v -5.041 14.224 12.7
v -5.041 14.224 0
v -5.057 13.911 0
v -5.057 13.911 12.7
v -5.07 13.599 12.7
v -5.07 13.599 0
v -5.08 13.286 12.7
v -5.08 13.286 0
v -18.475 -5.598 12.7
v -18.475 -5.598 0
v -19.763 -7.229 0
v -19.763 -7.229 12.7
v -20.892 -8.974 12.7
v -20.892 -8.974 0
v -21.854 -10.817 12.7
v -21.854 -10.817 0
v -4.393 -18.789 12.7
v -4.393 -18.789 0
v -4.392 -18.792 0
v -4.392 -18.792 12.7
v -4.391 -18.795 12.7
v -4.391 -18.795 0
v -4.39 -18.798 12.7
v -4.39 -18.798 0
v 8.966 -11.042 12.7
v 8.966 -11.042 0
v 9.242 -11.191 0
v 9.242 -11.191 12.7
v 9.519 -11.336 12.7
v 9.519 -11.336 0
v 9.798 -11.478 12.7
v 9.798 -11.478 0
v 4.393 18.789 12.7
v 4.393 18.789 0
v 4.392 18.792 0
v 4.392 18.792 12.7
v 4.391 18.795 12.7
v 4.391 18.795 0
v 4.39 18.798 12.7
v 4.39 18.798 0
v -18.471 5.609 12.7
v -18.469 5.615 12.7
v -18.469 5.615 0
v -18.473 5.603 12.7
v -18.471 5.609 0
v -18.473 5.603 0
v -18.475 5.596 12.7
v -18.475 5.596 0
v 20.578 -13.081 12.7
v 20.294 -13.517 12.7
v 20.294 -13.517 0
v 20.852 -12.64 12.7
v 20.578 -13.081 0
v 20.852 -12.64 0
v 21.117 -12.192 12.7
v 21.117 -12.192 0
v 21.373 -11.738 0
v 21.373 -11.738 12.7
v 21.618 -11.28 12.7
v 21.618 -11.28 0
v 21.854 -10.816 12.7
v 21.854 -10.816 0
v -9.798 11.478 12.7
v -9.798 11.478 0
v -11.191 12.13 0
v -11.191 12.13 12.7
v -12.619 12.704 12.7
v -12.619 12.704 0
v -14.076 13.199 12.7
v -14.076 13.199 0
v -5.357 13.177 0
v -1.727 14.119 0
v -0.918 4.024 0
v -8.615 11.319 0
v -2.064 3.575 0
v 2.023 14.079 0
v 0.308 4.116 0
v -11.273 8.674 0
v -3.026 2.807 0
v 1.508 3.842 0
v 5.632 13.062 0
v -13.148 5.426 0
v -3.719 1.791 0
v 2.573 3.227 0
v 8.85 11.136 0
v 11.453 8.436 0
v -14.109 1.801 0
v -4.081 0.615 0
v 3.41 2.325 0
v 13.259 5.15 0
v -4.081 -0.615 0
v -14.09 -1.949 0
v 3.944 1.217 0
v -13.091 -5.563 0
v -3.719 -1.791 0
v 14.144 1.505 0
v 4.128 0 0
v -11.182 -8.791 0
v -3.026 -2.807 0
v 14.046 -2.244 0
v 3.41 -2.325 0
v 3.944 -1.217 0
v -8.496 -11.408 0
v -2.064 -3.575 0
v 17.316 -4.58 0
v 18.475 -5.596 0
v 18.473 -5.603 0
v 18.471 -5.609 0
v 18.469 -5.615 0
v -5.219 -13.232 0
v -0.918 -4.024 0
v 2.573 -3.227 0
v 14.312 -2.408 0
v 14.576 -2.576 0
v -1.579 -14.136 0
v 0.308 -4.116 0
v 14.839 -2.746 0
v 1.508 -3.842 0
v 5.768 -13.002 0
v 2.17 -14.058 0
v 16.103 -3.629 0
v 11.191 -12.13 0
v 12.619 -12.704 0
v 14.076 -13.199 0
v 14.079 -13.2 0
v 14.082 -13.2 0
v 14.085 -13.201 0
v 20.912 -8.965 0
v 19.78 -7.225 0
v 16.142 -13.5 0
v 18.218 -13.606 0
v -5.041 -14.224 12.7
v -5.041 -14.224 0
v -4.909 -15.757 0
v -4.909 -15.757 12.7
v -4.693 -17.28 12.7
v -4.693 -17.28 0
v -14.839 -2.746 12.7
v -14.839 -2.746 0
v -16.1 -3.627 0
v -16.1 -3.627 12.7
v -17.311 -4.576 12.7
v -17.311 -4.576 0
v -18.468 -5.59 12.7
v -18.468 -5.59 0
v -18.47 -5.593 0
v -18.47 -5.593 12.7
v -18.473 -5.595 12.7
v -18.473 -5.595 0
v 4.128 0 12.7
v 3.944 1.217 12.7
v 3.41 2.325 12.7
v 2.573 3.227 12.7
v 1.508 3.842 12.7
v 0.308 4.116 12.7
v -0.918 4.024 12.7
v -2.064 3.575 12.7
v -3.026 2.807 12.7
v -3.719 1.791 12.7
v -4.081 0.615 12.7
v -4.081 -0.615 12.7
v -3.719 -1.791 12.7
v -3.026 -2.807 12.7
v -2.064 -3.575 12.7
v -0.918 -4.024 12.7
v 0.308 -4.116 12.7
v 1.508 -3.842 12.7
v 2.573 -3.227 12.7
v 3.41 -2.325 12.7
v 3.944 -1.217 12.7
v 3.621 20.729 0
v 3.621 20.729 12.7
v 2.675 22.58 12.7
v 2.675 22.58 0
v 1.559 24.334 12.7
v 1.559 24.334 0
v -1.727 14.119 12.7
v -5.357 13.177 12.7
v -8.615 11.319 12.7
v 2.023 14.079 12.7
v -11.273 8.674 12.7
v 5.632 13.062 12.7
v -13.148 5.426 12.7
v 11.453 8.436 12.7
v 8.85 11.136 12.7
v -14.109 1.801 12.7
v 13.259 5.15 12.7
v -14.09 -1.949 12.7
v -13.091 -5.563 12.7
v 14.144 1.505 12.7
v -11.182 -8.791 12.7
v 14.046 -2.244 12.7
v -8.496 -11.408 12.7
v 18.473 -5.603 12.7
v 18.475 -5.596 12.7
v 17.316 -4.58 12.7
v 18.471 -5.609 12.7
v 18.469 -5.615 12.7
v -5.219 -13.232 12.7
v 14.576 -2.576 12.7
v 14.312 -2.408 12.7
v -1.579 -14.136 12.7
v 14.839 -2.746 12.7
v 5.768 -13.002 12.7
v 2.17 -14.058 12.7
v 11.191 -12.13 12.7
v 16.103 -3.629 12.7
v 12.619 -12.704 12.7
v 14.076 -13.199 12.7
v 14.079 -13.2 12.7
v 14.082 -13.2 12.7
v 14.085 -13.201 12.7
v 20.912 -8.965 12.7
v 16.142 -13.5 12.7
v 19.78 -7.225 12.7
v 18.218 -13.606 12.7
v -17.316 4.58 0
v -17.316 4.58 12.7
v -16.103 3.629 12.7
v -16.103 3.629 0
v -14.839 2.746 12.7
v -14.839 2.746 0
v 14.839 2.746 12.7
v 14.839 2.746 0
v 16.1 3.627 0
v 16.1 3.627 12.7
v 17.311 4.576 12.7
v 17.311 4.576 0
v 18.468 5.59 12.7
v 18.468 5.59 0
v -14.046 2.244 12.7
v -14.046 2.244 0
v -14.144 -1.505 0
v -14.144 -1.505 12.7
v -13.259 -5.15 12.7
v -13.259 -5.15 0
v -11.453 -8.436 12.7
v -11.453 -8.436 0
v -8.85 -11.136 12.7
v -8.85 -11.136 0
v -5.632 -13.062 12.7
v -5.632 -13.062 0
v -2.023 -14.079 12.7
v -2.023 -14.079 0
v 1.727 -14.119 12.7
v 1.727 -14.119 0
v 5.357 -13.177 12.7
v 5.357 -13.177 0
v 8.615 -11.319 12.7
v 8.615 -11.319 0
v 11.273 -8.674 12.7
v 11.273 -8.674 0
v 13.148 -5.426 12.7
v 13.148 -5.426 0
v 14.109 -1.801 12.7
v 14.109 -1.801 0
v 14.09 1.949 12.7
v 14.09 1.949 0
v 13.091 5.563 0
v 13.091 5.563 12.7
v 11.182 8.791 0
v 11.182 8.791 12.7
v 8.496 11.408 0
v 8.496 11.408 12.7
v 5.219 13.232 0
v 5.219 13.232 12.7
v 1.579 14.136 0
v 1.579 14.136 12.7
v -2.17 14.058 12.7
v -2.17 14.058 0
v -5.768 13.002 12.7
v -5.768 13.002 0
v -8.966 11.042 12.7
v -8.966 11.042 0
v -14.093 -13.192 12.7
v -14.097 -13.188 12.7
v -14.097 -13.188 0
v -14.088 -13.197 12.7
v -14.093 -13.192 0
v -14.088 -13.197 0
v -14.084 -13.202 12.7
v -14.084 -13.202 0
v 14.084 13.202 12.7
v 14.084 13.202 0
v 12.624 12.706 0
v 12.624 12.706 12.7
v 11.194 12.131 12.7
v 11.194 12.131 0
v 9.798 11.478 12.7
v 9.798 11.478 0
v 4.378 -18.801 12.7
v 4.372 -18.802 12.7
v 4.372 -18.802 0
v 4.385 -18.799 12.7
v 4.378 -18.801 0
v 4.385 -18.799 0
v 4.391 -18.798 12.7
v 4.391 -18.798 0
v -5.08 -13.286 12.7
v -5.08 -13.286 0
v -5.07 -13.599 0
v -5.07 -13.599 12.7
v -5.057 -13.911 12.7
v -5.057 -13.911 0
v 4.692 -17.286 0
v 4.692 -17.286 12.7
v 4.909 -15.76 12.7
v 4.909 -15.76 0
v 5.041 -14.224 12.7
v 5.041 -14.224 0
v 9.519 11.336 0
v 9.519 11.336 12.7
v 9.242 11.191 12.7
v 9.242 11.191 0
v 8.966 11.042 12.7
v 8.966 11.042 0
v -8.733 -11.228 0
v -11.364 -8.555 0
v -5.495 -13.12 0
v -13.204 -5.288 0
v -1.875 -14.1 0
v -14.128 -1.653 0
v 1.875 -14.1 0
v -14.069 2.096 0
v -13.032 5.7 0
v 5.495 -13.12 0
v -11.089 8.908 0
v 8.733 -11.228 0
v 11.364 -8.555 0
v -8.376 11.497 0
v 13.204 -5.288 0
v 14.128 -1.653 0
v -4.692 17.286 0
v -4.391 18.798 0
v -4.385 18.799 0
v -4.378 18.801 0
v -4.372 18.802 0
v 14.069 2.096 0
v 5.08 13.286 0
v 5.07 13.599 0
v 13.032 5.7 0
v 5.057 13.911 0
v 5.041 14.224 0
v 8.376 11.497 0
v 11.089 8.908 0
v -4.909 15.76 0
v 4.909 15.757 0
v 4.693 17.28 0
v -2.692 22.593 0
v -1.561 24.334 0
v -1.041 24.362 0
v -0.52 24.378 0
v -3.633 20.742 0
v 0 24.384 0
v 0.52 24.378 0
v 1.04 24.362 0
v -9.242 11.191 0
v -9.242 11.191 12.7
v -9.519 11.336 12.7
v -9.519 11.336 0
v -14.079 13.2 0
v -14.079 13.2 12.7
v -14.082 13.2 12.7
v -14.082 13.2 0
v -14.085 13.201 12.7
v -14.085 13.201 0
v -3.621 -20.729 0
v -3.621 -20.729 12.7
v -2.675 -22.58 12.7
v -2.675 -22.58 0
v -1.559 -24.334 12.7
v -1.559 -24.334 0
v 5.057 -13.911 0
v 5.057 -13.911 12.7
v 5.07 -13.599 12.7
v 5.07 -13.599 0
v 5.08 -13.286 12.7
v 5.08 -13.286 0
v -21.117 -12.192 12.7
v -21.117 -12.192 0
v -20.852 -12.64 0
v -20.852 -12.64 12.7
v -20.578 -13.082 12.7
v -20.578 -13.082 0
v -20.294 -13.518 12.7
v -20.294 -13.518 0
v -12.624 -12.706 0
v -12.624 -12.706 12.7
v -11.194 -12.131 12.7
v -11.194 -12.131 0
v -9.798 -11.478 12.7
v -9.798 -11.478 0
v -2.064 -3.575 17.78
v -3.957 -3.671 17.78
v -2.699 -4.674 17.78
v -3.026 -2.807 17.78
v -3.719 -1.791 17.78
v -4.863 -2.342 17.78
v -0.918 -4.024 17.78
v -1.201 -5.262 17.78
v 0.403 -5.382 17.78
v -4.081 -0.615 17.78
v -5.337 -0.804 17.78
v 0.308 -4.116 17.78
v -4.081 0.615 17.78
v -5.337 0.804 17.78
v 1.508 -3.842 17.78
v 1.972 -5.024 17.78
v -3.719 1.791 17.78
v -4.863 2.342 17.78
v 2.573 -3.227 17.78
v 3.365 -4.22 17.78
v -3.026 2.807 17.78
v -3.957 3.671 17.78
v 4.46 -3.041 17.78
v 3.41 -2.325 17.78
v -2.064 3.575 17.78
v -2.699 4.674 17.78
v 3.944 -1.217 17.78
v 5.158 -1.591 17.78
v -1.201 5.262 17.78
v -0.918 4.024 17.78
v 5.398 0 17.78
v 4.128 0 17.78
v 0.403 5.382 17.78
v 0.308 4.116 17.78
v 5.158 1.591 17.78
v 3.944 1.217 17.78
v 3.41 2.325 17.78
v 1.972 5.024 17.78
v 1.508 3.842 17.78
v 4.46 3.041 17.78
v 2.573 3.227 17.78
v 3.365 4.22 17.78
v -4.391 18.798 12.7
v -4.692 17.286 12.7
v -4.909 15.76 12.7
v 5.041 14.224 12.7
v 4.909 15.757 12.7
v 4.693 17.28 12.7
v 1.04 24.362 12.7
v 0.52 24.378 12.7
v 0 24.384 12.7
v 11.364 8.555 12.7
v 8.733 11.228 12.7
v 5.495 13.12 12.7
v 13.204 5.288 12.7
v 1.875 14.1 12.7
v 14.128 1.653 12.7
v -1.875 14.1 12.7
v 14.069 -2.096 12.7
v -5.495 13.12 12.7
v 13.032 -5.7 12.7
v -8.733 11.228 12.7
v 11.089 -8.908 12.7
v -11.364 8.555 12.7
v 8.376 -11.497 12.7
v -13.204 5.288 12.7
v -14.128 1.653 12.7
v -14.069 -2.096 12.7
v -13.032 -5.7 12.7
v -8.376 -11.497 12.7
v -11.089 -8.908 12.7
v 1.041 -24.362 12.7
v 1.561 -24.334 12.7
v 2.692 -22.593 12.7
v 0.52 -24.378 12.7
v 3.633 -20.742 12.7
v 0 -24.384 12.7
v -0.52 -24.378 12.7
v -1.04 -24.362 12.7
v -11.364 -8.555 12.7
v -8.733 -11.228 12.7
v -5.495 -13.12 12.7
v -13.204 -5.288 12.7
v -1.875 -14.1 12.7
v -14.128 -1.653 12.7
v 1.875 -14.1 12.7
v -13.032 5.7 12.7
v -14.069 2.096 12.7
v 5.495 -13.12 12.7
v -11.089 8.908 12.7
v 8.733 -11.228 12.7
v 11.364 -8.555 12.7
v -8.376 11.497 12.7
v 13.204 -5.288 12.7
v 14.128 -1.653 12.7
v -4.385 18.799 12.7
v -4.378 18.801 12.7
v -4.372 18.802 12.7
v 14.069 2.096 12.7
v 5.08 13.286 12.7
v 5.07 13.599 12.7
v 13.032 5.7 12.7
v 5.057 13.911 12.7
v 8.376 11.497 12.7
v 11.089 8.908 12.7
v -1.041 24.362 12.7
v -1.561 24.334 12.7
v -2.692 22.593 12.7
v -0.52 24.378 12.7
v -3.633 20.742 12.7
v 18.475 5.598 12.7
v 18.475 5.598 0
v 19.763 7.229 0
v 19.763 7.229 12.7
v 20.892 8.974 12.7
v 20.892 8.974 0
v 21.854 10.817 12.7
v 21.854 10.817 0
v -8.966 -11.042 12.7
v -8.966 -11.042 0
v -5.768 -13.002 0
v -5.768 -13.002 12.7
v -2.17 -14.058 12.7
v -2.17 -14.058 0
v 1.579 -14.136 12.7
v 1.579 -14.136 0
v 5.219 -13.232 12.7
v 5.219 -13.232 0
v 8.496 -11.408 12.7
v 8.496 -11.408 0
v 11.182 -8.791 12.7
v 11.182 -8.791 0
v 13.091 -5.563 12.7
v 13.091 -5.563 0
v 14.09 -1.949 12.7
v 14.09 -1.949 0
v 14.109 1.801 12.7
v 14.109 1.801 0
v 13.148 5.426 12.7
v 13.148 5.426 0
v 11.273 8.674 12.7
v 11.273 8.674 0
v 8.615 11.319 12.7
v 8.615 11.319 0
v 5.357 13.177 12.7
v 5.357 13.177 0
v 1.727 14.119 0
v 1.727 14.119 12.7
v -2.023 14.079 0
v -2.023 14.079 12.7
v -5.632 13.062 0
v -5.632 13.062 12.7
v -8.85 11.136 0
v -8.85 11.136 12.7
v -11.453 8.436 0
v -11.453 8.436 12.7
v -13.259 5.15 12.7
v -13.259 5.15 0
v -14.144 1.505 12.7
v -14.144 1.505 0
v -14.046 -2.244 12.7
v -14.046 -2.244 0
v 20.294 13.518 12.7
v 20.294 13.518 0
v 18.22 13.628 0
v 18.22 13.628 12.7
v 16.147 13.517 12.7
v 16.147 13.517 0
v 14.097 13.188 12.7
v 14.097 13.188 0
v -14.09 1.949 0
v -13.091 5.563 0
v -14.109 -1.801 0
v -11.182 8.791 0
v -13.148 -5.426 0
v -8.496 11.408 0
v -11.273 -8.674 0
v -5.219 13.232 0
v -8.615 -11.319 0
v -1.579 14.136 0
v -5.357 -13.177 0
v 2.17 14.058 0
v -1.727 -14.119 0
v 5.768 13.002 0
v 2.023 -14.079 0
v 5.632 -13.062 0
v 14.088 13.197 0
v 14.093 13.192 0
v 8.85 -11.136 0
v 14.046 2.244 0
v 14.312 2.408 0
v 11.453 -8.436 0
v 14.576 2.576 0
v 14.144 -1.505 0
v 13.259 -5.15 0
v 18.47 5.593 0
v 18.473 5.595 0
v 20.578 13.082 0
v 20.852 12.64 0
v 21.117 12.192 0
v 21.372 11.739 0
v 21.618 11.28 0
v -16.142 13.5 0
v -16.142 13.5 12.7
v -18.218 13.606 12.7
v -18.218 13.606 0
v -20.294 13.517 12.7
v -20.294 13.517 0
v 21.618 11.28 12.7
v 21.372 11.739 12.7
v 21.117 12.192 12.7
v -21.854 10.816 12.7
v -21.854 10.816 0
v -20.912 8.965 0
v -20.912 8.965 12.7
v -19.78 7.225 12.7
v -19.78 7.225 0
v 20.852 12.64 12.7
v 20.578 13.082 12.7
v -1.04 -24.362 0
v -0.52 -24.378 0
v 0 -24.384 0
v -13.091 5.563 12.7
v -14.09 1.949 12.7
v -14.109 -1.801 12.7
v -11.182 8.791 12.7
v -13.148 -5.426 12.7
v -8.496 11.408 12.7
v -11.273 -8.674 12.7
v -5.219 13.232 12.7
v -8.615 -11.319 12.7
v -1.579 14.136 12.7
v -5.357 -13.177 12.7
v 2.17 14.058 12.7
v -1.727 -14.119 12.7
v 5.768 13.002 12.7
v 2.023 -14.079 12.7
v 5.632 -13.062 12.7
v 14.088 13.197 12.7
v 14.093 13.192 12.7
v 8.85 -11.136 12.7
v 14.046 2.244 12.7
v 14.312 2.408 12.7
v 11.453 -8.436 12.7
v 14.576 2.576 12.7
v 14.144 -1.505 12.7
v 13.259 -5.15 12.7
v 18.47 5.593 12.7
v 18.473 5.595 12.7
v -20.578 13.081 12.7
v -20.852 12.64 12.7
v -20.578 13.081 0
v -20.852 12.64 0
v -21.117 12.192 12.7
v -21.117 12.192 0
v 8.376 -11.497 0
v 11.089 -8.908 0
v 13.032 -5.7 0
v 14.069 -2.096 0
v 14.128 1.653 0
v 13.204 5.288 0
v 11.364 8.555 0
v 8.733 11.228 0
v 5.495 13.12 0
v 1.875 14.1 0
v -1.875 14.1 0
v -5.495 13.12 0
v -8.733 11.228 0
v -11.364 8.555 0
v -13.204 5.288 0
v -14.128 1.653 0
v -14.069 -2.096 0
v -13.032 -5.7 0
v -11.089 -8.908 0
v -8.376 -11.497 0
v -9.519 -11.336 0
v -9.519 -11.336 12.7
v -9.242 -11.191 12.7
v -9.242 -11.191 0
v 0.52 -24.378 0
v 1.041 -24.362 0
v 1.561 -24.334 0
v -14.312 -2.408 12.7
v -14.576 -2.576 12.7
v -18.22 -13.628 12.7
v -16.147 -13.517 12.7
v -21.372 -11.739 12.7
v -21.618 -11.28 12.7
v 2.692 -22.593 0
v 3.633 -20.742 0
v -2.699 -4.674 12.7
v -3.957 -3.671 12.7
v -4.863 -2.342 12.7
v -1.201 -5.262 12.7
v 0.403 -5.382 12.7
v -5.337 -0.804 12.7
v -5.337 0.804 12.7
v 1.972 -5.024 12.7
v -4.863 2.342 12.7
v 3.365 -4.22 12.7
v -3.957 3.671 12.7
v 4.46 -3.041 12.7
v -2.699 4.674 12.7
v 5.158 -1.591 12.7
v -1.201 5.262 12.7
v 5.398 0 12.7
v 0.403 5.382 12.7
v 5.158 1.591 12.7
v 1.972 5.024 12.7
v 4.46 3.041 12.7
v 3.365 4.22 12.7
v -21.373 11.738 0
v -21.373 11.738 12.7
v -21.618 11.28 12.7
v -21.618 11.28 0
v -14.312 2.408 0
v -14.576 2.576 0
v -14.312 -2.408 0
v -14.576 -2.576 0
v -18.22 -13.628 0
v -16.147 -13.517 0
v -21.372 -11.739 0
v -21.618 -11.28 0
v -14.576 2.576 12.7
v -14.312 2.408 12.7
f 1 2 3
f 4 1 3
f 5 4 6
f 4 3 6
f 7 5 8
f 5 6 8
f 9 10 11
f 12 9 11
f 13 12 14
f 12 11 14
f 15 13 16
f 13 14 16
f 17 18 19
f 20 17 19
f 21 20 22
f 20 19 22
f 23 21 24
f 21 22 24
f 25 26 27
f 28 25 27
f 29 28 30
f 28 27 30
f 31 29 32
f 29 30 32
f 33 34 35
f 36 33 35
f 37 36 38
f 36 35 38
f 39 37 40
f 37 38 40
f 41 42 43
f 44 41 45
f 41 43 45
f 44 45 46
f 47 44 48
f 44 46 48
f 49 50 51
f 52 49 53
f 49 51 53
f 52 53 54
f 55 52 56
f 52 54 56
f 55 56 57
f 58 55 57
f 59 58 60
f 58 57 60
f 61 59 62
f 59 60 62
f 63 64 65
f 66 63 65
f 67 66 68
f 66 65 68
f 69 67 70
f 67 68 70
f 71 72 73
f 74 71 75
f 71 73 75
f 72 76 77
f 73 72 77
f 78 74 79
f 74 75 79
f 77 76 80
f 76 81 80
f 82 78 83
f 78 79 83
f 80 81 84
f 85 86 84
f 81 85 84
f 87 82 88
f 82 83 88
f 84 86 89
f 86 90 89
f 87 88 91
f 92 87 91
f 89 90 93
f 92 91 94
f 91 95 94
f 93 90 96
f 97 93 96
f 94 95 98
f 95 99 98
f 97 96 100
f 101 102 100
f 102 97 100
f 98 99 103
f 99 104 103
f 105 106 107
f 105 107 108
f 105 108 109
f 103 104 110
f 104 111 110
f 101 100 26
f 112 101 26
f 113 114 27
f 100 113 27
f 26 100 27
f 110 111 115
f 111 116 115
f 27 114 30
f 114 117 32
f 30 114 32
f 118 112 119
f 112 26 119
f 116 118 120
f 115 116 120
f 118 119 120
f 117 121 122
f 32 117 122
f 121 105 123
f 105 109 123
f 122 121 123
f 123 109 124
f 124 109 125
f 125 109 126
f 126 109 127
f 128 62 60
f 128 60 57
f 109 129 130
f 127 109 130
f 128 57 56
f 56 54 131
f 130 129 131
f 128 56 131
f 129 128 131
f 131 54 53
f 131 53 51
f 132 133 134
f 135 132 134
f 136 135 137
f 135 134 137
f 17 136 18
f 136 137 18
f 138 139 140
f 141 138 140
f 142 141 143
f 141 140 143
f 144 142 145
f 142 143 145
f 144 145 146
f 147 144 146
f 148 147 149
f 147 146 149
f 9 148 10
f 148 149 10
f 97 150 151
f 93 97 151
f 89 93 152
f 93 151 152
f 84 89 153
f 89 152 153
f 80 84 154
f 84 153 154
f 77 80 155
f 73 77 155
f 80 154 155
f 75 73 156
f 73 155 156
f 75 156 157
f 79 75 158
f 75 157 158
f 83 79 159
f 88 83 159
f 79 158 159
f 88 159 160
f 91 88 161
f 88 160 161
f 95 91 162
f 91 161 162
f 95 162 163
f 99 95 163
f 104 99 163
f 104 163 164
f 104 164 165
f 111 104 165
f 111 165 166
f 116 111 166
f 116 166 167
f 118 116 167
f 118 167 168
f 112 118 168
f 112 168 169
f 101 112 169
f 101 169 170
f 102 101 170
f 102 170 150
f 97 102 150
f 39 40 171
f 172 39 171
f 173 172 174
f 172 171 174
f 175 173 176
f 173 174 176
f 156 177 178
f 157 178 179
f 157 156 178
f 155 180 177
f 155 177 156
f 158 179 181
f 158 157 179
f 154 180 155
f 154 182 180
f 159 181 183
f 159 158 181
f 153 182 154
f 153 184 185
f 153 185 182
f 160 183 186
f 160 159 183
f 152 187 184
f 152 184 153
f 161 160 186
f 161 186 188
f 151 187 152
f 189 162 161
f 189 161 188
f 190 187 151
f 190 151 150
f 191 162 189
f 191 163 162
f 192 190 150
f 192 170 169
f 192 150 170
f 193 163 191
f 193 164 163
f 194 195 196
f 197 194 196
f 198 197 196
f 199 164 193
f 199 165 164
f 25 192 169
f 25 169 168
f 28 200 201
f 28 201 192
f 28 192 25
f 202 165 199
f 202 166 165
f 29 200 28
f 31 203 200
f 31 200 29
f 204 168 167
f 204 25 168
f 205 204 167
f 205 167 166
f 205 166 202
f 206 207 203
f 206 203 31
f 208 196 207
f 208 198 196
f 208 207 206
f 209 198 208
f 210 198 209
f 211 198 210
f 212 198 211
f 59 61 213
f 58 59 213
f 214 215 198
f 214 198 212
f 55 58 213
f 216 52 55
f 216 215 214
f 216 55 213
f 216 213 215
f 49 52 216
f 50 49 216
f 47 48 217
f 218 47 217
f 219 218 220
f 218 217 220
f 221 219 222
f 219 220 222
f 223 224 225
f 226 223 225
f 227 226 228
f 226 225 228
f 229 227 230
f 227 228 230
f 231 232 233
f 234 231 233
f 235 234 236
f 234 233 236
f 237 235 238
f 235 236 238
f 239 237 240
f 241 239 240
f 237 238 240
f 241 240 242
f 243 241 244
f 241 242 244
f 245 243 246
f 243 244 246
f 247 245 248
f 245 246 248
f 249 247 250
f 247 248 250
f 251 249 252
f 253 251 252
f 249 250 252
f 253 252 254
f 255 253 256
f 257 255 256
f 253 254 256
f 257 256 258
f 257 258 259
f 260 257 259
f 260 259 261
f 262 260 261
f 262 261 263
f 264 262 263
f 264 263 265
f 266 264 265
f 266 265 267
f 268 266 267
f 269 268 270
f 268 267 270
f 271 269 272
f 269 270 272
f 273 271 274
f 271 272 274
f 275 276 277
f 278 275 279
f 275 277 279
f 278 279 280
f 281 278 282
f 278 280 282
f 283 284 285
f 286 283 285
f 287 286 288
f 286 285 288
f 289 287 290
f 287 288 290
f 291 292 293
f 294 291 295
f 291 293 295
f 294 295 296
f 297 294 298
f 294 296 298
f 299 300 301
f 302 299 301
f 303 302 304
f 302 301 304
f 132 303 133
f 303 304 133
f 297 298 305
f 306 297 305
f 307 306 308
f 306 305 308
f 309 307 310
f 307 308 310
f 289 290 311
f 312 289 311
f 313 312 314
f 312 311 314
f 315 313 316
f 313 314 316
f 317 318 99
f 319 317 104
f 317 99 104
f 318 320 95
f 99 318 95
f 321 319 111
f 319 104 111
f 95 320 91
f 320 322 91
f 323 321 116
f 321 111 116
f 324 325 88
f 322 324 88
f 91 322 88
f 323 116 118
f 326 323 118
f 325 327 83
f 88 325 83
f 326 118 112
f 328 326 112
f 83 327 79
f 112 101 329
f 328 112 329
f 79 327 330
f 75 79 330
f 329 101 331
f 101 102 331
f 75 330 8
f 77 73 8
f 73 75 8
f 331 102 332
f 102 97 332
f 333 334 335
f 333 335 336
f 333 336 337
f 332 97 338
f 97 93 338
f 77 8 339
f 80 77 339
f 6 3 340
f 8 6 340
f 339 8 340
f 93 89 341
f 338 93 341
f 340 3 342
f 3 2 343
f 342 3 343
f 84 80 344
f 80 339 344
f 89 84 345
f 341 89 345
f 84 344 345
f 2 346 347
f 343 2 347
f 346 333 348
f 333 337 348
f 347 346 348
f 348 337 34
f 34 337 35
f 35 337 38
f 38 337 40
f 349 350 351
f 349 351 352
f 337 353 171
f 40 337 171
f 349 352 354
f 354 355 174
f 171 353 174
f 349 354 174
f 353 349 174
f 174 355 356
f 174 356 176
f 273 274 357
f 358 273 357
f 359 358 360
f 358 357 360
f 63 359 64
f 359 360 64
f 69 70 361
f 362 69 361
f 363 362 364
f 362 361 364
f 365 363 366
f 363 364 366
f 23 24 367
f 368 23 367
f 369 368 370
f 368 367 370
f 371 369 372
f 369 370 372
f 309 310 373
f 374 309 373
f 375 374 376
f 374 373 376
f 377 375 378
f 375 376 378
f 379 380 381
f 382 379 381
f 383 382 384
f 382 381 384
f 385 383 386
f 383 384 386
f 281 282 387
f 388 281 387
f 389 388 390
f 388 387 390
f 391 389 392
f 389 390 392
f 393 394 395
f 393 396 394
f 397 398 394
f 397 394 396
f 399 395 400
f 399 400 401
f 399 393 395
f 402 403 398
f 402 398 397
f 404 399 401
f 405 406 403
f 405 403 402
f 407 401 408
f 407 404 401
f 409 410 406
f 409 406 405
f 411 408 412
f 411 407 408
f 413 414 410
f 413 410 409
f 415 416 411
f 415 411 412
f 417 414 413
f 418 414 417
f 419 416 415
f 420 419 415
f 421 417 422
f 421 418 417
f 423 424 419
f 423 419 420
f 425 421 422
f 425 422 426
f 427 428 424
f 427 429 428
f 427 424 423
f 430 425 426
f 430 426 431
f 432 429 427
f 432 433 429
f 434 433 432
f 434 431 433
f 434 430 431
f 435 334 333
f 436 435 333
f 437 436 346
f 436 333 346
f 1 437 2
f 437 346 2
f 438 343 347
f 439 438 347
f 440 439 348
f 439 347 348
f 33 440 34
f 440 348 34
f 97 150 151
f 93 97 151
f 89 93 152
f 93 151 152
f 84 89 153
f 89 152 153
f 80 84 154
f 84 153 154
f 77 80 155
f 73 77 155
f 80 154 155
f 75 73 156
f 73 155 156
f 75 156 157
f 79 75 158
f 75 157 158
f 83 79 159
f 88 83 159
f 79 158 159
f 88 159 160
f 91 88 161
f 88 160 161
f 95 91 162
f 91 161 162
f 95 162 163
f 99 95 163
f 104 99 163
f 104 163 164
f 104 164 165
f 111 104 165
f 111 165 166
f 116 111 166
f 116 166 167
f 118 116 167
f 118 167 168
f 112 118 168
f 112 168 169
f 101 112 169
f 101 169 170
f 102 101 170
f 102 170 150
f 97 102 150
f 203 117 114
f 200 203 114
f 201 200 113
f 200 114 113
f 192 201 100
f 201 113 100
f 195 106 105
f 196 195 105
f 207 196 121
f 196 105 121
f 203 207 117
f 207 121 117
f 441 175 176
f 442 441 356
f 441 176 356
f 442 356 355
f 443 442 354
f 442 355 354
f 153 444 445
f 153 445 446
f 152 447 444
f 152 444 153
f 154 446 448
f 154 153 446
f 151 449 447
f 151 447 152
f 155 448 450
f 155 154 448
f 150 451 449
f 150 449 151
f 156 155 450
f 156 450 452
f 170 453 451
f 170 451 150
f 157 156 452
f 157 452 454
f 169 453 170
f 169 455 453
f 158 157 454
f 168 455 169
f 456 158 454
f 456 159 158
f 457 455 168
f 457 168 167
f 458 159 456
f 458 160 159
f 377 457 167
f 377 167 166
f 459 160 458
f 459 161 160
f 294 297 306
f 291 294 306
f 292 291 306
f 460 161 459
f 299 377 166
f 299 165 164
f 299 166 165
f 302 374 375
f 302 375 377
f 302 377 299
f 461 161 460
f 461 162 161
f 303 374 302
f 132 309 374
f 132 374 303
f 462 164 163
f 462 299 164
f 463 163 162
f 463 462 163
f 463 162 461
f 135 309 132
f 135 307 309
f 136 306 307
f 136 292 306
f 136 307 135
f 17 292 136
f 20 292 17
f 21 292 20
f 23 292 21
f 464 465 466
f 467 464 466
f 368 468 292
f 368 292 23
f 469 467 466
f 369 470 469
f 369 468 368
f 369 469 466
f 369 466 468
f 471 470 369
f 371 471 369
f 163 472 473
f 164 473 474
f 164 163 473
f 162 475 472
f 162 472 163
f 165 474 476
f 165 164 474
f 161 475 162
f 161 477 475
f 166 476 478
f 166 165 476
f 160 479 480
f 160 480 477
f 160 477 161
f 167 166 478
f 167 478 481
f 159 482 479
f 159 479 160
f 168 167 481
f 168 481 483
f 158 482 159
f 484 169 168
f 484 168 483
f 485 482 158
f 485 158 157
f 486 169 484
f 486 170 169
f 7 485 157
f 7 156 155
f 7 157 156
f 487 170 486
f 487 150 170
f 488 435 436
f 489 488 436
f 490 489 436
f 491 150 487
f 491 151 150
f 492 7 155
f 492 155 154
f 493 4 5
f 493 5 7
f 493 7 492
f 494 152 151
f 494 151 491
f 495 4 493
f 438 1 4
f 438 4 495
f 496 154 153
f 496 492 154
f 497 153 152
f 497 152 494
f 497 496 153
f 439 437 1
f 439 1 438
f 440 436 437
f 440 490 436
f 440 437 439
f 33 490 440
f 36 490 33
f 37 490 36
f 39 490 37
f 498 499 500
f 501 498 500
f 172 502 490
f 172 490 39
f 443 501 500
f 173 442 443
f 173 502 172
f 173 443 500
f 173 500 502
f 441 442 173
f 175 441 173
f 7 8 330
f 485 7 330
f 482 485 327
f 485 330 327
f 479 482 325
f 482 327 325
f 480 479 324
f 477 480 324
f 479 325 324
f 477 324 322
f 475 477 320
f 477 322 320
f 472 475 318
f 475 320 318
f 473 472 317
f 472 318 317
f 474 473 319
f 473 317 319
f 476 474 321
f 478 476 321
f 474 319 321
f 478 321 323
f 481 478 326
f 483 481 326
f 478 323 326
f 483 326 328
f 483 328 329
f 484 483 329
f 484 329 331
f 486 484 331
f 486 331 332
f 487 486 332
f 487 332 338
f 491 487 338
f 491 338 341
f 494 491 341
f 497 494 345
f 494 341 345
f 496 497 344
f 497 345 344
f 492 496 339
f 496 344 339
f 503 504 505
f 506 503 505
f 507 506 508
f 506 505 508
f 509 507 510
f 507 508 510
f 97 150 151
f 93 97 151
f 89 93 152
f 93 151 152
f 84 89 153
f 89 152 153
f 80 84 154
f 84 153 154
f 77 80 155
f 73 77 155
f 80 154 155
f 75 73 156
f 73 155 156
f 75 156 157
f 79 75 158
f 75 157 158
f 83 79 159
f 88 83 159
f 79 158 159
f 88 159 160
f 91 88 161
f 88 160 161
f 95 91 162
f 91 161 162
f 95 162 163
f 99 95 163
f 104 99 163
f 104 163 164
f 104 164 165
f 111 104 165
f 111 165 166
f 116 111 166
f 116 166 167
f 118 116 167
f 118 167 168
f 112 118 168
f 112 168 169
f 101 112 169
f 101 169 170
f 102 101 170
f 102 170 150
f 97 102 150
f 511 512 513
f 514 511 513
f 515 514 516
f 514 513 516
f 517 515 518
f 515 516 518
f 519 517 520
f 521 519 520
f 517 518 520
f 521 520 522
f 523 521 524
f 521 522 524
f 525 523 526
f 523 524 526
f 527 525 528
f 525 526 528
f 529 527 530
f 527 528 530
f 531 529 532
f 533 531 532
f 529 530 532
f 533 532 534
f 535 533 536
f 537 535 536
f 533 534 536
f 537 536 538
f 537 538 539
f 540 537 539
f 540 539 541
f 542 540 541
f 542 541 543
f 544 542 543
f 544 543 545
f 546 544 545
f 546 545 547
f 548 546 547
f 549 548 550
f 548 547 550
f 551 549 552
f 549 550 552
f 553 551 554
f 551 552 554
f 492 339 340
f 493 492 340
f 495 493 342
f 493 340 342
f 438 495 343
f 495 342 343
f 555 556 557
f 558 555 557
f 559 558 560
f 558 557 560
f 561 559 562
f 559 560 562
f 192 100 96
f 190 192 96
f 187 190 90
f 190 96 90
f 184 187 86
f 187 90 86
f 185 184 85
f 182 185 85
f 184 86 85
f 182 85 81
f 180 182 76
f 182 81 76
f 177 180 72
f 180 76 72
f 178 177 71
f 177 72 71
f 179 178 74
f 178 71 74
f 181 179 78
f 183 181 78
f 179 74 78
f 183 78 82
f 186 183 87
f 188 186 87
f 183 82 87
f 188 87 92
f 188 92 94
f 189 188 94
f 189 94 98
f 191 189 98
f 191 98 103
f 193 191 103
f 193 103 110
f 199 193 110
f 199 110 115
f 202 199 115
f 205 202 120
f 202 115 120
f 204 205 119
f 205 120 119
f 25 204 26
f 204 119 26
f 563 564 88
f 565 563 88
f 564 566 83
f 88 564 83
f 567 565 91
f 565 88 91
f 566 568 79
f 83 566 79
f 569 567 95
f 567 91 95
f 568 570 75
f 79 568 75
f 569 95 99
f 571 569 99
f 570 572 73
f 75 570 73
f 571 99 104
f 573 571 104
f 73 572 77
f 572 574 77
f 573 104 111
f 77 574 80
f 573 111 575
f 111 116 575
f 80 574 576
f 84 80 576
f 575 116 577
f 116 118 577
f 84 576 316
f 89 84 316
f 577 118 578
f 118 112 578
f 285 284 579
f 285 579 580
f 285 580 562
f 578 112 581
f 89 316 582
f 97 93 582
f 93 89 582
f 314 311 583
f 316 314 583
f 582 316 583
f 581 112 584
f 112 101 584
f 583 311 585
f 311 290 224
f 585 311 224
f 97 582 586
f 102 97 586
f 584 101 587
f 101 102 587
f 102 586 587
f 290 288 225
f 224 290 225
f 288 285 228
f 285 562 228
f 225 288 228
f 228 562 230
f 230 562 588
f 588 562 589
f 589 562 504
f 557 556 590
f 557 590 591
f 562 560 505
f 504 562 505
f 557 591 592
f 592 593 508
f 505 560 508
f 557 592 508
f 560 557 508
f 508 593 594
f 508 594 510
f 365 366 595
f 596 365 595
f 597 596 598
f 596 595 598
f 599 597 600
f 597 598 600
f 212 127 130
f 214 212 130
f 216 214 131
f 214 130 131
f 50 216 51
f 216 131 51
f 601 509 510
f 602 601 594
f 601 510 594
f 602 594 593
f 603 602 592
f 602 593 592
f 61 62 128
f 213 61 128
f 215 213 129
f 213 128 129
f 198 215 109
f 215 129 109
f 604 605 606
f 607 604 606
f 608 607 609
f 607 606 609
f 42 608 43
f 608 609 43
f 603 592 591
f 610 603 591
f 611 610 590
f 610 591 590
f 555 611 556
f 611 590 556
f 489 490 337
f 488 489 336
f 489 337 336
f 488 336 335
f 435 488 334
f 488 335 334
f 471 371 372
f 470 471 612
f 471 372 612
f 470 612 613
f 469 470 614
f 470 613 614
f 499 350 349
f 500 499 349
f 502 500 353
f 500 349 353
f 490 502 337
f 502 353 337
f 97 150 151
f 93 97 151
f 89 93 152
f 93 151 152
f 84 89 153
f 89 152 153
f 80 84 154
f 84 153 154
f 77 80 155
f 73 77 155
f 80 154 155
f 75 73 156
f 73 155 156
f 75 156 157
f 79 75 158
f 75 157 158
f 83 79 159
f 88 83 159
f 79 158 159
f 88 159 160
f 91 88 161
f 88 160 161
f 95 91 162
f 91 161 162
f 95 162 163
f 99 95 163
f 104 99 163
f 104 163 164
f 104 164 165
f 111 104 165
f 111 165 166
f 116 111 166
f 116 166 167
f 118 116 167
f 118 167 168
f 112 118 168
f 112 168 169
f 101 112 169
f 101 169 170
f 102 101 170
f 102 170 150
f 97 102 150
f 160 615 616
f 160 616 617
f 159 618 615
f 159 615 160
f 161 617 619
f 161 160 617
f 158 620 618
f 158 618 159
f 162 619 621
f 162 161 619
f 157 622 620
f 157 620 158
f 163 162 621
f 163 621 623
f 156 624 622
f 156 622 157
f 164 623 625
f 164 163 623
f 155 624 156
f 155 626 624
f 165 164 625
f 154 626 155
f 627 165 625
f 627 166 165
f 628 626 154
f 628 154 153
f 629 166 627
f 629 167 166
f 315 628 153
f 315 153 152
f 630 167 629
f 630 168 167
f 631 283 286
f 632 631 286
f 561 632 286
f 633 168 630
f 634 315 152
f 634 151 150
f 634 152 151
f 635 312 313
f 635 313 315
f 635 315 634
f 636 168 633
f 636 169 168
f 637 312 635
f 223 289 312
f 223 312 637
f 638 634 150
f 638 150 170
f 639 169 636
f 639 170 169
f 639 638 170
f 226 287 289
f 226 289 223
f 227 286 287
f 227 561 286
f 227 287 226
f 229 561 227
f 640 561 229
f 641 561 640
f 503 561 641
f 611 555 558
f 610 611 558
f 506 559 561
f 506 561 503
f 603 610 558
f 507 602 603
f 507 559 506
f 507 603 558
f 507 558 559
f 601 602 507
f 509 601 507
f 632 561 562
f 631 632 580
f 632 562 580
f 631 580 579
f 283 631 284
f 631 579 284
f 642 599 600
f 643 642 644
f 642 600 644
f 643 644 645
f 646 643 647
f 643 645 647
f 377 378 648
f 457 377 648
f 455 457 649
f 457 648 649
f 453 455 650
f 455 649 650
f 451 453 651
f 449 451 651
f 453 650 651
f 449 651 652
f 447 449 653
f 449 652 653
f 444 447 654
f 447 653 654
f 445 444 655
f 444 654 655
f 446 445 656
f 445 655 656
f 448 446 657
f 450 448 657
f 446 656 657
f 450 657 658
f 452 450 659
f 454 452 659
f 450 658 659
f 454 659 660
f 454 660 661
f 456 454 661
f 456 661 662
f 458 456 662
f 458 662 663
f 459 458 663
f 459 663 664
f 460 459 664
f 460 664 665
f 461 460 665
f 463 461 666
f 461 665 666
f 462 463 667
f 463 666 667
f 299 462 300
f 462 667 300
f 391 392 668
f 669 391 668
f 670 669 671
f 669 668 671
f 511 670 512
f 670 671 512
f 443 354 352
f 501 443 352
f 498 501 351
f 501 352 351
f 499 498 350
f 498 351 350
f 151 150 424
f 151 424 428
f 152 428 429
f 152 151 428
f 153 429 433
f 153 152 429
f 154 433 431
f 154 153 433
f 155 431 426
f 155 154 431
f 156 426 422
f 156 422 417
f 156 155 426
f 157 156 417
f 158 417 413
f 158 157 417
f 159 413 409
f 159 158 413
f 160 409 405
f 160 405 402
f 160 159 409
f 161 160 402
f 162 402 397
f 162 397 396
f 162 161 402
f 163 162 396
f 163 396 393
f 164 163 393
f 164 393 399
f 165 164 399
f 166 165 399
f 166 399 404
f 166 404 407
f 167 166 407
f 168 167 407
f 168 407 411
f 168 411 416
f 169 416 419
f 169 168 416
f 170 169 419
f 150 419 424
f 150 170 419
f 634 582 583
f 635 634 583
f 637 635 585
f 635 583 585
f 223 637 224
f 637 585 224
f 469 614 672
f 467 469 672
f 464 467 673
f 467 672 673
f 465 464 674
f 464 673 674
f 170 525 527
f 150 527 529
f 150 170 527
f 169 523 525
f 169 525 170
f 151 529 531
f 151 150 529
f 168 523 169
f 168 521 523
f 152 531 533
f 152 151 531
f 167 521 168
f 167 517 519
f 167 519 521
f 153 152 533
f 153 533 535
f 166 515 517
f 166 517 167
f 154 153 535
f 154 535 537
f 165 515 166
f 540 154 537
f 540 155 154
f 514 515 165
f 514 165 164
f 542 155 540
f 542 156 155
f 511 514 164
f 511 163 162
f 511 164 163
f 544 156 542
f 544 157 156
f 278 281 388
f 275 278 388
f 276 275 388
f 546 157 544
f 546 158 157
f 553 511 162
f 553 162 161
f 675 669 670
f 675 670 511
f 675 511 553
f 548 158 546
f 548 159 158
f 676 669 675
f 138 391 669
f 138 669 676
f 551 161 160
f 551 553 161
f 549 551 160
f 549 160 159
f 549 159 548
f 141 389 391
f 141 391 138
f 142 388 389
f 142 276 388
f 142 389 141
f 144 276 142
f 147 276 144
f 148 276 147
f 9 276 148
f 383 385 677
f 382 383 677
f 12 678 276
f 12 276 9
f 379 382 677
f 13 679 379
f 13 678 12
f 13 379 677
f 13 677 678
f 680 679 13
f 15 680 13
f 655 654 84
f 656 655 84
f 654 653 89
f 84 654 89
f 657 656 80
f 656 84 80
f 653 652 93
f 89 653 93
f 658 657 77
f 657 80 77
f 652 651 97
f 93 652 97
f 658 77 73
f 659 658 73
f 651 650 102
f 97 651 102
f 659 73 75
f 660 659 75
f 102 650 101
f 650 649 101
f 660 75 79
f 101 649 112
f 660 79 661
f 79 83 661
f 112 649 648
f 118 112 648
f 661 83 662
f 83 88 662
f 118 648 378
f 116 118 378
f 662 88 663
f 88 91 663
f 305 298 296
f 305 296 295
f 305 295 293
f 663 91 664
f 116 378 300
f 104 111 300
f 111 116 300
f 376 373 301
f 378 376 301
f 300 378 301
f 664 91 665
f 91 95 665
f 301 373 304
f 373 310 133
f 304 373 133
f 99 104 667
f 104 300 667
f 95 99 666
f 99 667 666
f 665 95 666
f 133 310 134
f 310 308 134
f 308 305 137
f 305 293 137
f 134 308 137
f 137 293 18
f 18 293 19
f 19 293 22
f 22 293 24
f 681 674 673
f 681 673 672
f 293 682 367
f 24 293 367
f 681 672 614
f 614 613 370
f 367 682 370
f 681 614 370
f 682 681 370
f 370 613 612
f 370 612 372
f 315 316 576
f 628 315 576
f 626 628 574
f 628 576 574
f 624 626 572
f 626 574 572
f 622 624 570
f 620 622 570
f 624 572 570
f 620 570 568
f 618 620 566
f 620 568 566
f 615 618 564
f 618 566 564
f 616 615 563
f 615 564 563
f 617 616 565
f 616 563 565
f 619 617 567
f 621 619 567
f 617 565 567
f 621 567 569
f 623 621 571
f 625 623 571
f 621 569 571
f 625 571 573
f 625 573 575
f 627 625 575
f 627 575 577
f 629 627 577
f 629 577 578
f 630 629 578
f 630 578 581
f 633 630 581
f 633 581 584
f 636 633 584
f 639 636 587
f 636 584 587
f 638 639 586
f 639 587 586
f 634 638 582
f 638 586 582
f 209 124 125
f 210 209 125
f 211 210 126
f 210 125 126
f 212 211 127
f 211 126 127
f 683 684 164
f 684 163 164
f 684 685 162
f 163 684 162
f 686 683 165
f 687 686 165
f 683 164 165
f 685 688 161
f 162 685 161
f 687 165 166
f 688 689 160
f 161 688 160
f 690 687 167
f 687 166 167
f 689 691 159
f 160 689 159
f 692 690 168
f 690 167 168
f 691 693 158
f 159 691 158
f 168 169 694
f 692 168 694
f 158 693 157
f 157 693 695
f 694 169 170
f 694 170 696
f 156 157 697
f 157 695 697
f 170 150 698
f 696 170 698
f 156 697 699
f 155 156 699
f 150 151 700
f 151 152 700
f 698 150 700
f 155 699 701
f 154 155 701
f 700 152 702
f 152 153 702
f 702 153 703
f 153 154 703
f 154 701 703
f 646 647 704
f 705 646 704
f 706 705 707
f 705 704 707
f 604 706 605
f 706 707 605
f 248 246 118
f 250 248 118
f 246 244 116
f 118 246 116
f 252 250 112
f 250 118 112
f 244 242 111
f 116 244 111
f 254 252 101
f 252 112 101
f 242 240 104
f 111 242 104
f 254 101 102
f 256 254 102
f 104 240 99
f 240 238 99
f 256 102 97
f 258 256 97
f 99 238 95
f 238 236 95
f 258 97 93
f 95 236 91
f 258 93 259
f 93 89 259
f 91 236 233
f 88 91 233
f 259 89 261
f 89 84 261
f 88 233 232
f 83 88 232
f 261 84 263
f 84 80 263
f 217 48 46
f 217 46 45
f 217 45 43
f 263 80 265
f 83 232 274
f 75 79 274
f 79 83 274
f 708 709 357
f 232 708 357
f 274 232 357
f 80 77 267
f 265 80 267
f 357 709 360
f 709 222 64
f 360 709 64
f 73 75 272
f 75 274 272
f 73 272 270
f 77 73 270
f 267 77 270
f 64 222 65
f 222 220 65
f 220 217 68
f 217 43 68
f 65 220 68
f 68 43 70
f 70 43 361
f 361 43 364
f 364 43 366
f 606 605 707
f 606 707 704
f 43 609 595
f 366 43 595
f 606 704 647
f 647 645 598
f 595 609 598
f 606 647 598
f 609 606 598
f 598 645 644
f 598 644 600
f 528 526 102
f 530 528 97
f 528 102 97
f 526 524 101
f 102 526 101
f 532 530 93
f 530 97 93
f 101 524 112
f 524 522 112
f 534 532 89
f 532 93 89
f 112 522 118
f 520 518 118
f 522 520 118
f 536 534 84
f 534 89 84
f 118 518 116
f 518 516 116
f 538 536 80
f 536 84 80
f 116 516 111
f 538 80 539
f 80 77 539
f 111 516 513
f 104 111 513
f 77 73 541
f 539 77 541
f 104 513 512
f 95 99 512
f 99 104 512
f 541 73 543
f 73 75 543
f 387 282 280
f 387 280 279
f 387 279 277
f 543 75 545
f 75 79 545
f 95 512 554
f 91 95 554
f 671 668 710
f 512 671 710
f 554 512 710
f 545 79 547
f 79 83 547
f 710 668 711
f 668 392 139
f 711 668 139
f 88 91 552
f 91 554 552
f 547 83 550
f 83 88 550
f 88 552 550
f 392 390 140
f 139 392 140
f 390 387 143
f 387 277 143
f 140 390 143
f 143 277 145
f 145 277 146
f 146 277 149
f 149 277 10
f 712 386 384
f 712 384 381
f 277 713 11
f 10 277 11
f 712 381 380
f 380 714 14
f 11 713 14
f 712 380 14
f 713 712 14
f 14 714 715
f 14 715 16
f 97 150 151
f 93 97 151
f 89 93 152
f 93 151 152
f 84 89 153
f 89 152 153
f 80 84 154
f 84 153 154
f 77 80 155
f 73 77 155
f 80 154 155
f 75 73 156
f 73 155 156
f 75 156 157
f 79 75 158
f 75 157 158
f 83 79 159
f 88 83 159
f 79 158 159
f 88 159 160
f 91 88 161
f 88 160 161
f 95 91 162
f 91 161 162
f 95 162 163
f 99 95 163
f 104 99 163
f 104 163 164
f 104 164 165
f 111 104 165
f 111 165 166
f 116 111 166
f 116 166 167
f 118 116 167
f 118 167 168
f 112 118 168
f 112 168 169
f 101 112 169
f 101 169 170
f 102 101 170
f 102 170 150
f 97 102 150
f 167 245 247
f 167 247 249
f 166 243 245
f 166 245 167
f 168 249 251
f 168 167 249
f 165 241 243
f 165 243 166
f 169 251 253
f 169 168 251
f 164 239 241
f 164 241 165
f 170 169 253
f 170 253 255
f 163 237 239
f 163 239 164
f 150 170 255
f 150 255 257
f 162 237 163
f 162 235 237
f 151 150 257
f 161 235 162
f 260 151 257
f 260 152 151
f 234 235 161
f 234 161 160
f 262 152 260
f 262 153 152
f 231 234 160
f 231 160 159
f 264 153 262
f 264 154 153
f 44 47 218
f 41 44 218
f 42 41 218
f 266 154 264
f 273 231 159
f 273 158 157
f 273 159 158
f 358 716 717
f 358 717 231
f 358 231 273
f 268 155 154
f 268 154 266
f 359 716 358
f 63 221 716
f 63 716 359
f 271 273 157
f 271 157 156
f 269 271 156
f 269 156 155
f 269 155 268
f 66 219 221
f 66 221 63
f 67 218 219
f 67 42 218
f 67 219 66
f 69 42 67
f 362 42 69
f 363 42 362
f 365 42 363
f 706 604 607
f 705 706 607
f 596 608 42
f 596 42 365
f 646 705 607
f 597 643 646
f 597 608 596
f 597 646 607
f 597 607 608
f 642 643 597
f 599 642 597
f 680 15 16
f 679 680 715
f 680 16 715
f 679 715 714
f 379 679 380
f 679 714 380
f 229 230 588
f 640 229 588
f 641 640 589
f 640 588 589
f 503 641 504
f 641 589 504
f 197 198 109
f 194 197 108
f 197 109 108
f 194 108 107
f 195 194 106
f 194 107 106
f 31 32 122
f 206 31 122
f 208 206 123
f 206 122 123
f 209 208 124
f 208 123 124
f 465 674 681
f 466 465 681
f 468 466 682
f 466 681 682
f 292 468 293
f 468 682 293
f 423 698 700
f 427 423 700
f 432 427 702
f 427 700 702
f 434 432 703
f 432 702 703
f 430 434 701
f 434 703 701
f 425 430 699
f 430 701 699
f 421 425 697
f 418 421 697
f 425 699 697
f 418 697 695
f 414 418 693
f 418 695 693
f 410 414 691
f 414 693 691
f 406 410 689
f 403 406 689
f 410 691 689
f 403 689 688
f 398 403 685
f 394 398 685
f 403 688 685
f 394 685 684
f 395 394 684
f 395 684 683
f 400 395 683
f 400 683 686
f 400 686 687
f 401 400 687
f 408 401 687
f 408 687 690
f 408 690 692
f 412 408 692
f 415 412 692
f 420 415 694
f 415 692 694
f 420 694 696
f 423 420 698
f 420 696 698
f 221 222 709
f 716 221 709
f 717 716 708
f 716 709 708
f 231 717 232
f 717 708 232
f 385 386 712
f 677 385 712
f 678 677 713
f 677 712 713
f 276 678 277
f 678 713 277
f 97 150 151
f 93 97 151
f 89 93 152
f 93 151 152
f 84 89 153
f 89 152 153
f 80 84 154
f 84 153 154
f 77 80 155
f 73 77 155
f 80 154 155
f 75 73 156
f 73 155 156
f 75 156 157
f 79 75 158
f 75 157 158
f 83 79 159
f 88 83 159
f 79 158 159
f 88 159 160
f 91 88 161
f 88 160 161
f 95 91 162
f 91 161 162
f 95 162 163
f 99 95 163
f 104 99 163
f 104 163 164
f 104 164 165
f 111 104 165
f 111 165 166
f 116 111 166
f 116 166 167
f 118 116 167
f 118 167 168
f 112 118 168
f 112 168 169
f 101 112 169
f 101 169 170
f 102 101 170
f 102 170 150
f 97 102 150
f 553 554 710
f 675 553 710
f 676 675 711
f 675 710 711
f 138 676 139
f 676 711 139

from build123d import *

# Parameters (mm, degrees)
F1_DEPTH = 12.7
F2_COUNT = 6
F3_R     = 4.1275
F4_DEPTH = 25.4
F5_R     = 5.3975
F5_R_2   = 4.1275
F6_DEPTH = 5.08


with BuildPart() as f1:
    # F0 (on Top) → F1 (new body)
    with BuildSketch(Plane.XY):
        with BuildLine():
            ThreePointArc((0, 19.304), (2.209384841, 19.1771487616), (4.3897328809, 18.7982621865))
            ThreePointArc((4.3897328809, 18.7982621865), (3.169400646, 21.6658446075), (1.5592239792, 24.3340969954))
            ThreePointArc((1.5592239792, 24.3340969954), (0.7800111741, 24.3715210557), (0, 24.384))
            Line((0, 24.384), (0, 19.304))
        make_face()
        with BuildLine():
            ThreePointArc((-1.5605116, 24.334014456), (-3.1867661988, 21.6801927129), (-4.3722618118, 18.8023334363))
            ThreePointArc((-4.3722618118, 18.8023334363), (-2.2004739656, 19.1781732792), (0, 19.304))
            Line((0, 19.304), (0, 24.384))
            ThreePointArc((0, 24.384), (-0.7806559755, 24.3715004103), (-1.5605116, 24.334014456))
        make_face()
        with BuildLine():
            ThreePointArc((5.08, 13.2859239799), (2.5829434091, 13.987515124), (0, 14.224))
            ThreePointArc((0, 14.224), (-2.5829434091, 13.987515124), (-5.08, 13.2859239799))
            ThreePointArc((-5.08, 13.2859239799), (-8.0642499961, -11.7170835962), (14.224, 0))
            ThreePointArc((14.224, 0), (11.7170835962, 8.0642499961), (5.08, 13.2859239799))
        make_face()
        with BuildLine():
            ThreePointArc((-4.3722618118, 18.8023334363), (-4.3815517662, 18.8001707471), (-4.3908406509, 18.7980034679))
            ThreePointArc((-4.3908406509, 18.7980034679), (-4.8105950781, 16.5244618609), (-5.0409436067, 14.224))
            Line((-5.0409436067, 14.224), (0, 14.224))
            Line((0, 14.224), (0, 19.304))
            ThreePointArc((0, 19.304), (-2.2004739656, 19.1781732792), (-4.3722618118, 18.8023334363))
        make_face()
        with BuildLine():
            ThreePointArc((4.3928229559, 18.7892941844), (4.3912783978, 18.7937783506), (4.3897328809, 18.7982621865))
            ThreePointArc((4.3897328809, 18.7982621865), (2.209384841, 19.1771487616), (0, 19.304))
            Line((0, 19.304), (0, 14.224))
            Line((0, 14.224), (5.0409436067, 14.224))
            ThreePointArc((5.0409436067, 14.224), (4.8112231634, 16.5200402325), (4.3928229559, 18.7892941844))
        make_face()
        with BuildLine():
            ThreePointArc((5.08, 13.2859239799), (5.0644124402, 13.7551260567), (5.0409436067, 14.224))
            Line((5.0409436067, 14.224), (0, 14.224))
            ThreePointArc((0, 14.224), (2.5829434091, 13.987515124), (5.08, 13.2859239799))
        make_face()
        with BuildLine():
            Line((0, 14.224), (-5.0409436067, 14.224))
            ThreePointArc((-5.0409436067, 14.224), (-5.0644124402, 13.7551260567), (-5.08, 13.2859239799))
            ThreePointArc((-5.08, 13.2859239799), (-2.5829434091, 13.987515124), (0, 14.224))
        make_face()
    extrude(amount=F1_DEPTH)


with BuildPart() as f2_1:
    # F2: instance of F1
    add(f1.part.rotate(Axis((0, 0, 0), (0, 0, -1)), 1 * 360 / F2_COUNT))


with BuildPart() as f2_2:
    # F2: instance of F1
    add(f1.part.rotate(Axis((0, 0, 0), (0, 0, -1)), 2 * 360 / F2_COUNT))


with BuildPart() as f2_3:
    # F2: instance of F1
    add(f1.part.rotate(Axis((0, 0, 0), (0, 0, -1)), 3 * 360 / F2_COUNT))


with BuildPart() as f2_4:
    # F2: instance of F1
    add(f1.part.rotate(Axis((0, 0, 0), (0, 0, -1)), 4 * 360 / F2_COUNT))


with BuildPart() as f2_5:
    # F2: instance of F1
    add(f1.part.rotate(Axis((0, 0, 0), (0, 0, -1)), 5 * 360 / F2_COUNT))


with BuildPart() as f4_tool:
    # F3 (on face) → F4 (new body)
    with BuildSketch(Plane.XY.offset(12.7)):
        Circle(F3_R)
    extrude(amount=-F4_DEPTH)


with BuildPart() as f1_1:
    add(f1.part)

    # F4: cut by f4_tool
    add(f4_tool.part, mode=Mode.SUBTRACT)


with BuildPart() as f2_1_1:
    add(f2_1.part)

    # F4: cut by f4_tool
    add(f4_tool.part, mode=Mode.SUBTRACT)


with BuildPart() as f2_2_1:
    add(f2_2.part)

    # F4: cut by f4_tool
    add(f4_tool.part, mode=Mode.SUBTRACT)


with BuildPart() as f2_3_1:
    add(f2_3.part)

    # F4: cut by f4_tool
    add(f4_tool.part, mode=Mode.SUBTRACT)


with BuildPart() as f2_4_1:
    add(f2_4.part)

    # F4: cut by f4_tool
    add(f4_tool.part, mode=Mode.SUBTRACT)


with BuildPart() as f2_5_1:
    add(f2_5.part)

    # F4: cut by f4_tool
    add(f4_tool.part, mode=Mode.SUBTRACT)


with BuildPart() as f6:
    # F5 (on face) → F6 (new body)
    with BuildSketch(Plane.XY.offset(12.7)):
        Circle(F5_R)
        Circle(F5_R_2, mode=Mode.SUBTRACT)
    extrude(amount=F6_DEPTH)


solid = Compound([f1_1.part, f2_1_1.part, f2_2_1.part, f2_3_1.part, f2_4_1.part, f2_5_1.part, f6.part])
